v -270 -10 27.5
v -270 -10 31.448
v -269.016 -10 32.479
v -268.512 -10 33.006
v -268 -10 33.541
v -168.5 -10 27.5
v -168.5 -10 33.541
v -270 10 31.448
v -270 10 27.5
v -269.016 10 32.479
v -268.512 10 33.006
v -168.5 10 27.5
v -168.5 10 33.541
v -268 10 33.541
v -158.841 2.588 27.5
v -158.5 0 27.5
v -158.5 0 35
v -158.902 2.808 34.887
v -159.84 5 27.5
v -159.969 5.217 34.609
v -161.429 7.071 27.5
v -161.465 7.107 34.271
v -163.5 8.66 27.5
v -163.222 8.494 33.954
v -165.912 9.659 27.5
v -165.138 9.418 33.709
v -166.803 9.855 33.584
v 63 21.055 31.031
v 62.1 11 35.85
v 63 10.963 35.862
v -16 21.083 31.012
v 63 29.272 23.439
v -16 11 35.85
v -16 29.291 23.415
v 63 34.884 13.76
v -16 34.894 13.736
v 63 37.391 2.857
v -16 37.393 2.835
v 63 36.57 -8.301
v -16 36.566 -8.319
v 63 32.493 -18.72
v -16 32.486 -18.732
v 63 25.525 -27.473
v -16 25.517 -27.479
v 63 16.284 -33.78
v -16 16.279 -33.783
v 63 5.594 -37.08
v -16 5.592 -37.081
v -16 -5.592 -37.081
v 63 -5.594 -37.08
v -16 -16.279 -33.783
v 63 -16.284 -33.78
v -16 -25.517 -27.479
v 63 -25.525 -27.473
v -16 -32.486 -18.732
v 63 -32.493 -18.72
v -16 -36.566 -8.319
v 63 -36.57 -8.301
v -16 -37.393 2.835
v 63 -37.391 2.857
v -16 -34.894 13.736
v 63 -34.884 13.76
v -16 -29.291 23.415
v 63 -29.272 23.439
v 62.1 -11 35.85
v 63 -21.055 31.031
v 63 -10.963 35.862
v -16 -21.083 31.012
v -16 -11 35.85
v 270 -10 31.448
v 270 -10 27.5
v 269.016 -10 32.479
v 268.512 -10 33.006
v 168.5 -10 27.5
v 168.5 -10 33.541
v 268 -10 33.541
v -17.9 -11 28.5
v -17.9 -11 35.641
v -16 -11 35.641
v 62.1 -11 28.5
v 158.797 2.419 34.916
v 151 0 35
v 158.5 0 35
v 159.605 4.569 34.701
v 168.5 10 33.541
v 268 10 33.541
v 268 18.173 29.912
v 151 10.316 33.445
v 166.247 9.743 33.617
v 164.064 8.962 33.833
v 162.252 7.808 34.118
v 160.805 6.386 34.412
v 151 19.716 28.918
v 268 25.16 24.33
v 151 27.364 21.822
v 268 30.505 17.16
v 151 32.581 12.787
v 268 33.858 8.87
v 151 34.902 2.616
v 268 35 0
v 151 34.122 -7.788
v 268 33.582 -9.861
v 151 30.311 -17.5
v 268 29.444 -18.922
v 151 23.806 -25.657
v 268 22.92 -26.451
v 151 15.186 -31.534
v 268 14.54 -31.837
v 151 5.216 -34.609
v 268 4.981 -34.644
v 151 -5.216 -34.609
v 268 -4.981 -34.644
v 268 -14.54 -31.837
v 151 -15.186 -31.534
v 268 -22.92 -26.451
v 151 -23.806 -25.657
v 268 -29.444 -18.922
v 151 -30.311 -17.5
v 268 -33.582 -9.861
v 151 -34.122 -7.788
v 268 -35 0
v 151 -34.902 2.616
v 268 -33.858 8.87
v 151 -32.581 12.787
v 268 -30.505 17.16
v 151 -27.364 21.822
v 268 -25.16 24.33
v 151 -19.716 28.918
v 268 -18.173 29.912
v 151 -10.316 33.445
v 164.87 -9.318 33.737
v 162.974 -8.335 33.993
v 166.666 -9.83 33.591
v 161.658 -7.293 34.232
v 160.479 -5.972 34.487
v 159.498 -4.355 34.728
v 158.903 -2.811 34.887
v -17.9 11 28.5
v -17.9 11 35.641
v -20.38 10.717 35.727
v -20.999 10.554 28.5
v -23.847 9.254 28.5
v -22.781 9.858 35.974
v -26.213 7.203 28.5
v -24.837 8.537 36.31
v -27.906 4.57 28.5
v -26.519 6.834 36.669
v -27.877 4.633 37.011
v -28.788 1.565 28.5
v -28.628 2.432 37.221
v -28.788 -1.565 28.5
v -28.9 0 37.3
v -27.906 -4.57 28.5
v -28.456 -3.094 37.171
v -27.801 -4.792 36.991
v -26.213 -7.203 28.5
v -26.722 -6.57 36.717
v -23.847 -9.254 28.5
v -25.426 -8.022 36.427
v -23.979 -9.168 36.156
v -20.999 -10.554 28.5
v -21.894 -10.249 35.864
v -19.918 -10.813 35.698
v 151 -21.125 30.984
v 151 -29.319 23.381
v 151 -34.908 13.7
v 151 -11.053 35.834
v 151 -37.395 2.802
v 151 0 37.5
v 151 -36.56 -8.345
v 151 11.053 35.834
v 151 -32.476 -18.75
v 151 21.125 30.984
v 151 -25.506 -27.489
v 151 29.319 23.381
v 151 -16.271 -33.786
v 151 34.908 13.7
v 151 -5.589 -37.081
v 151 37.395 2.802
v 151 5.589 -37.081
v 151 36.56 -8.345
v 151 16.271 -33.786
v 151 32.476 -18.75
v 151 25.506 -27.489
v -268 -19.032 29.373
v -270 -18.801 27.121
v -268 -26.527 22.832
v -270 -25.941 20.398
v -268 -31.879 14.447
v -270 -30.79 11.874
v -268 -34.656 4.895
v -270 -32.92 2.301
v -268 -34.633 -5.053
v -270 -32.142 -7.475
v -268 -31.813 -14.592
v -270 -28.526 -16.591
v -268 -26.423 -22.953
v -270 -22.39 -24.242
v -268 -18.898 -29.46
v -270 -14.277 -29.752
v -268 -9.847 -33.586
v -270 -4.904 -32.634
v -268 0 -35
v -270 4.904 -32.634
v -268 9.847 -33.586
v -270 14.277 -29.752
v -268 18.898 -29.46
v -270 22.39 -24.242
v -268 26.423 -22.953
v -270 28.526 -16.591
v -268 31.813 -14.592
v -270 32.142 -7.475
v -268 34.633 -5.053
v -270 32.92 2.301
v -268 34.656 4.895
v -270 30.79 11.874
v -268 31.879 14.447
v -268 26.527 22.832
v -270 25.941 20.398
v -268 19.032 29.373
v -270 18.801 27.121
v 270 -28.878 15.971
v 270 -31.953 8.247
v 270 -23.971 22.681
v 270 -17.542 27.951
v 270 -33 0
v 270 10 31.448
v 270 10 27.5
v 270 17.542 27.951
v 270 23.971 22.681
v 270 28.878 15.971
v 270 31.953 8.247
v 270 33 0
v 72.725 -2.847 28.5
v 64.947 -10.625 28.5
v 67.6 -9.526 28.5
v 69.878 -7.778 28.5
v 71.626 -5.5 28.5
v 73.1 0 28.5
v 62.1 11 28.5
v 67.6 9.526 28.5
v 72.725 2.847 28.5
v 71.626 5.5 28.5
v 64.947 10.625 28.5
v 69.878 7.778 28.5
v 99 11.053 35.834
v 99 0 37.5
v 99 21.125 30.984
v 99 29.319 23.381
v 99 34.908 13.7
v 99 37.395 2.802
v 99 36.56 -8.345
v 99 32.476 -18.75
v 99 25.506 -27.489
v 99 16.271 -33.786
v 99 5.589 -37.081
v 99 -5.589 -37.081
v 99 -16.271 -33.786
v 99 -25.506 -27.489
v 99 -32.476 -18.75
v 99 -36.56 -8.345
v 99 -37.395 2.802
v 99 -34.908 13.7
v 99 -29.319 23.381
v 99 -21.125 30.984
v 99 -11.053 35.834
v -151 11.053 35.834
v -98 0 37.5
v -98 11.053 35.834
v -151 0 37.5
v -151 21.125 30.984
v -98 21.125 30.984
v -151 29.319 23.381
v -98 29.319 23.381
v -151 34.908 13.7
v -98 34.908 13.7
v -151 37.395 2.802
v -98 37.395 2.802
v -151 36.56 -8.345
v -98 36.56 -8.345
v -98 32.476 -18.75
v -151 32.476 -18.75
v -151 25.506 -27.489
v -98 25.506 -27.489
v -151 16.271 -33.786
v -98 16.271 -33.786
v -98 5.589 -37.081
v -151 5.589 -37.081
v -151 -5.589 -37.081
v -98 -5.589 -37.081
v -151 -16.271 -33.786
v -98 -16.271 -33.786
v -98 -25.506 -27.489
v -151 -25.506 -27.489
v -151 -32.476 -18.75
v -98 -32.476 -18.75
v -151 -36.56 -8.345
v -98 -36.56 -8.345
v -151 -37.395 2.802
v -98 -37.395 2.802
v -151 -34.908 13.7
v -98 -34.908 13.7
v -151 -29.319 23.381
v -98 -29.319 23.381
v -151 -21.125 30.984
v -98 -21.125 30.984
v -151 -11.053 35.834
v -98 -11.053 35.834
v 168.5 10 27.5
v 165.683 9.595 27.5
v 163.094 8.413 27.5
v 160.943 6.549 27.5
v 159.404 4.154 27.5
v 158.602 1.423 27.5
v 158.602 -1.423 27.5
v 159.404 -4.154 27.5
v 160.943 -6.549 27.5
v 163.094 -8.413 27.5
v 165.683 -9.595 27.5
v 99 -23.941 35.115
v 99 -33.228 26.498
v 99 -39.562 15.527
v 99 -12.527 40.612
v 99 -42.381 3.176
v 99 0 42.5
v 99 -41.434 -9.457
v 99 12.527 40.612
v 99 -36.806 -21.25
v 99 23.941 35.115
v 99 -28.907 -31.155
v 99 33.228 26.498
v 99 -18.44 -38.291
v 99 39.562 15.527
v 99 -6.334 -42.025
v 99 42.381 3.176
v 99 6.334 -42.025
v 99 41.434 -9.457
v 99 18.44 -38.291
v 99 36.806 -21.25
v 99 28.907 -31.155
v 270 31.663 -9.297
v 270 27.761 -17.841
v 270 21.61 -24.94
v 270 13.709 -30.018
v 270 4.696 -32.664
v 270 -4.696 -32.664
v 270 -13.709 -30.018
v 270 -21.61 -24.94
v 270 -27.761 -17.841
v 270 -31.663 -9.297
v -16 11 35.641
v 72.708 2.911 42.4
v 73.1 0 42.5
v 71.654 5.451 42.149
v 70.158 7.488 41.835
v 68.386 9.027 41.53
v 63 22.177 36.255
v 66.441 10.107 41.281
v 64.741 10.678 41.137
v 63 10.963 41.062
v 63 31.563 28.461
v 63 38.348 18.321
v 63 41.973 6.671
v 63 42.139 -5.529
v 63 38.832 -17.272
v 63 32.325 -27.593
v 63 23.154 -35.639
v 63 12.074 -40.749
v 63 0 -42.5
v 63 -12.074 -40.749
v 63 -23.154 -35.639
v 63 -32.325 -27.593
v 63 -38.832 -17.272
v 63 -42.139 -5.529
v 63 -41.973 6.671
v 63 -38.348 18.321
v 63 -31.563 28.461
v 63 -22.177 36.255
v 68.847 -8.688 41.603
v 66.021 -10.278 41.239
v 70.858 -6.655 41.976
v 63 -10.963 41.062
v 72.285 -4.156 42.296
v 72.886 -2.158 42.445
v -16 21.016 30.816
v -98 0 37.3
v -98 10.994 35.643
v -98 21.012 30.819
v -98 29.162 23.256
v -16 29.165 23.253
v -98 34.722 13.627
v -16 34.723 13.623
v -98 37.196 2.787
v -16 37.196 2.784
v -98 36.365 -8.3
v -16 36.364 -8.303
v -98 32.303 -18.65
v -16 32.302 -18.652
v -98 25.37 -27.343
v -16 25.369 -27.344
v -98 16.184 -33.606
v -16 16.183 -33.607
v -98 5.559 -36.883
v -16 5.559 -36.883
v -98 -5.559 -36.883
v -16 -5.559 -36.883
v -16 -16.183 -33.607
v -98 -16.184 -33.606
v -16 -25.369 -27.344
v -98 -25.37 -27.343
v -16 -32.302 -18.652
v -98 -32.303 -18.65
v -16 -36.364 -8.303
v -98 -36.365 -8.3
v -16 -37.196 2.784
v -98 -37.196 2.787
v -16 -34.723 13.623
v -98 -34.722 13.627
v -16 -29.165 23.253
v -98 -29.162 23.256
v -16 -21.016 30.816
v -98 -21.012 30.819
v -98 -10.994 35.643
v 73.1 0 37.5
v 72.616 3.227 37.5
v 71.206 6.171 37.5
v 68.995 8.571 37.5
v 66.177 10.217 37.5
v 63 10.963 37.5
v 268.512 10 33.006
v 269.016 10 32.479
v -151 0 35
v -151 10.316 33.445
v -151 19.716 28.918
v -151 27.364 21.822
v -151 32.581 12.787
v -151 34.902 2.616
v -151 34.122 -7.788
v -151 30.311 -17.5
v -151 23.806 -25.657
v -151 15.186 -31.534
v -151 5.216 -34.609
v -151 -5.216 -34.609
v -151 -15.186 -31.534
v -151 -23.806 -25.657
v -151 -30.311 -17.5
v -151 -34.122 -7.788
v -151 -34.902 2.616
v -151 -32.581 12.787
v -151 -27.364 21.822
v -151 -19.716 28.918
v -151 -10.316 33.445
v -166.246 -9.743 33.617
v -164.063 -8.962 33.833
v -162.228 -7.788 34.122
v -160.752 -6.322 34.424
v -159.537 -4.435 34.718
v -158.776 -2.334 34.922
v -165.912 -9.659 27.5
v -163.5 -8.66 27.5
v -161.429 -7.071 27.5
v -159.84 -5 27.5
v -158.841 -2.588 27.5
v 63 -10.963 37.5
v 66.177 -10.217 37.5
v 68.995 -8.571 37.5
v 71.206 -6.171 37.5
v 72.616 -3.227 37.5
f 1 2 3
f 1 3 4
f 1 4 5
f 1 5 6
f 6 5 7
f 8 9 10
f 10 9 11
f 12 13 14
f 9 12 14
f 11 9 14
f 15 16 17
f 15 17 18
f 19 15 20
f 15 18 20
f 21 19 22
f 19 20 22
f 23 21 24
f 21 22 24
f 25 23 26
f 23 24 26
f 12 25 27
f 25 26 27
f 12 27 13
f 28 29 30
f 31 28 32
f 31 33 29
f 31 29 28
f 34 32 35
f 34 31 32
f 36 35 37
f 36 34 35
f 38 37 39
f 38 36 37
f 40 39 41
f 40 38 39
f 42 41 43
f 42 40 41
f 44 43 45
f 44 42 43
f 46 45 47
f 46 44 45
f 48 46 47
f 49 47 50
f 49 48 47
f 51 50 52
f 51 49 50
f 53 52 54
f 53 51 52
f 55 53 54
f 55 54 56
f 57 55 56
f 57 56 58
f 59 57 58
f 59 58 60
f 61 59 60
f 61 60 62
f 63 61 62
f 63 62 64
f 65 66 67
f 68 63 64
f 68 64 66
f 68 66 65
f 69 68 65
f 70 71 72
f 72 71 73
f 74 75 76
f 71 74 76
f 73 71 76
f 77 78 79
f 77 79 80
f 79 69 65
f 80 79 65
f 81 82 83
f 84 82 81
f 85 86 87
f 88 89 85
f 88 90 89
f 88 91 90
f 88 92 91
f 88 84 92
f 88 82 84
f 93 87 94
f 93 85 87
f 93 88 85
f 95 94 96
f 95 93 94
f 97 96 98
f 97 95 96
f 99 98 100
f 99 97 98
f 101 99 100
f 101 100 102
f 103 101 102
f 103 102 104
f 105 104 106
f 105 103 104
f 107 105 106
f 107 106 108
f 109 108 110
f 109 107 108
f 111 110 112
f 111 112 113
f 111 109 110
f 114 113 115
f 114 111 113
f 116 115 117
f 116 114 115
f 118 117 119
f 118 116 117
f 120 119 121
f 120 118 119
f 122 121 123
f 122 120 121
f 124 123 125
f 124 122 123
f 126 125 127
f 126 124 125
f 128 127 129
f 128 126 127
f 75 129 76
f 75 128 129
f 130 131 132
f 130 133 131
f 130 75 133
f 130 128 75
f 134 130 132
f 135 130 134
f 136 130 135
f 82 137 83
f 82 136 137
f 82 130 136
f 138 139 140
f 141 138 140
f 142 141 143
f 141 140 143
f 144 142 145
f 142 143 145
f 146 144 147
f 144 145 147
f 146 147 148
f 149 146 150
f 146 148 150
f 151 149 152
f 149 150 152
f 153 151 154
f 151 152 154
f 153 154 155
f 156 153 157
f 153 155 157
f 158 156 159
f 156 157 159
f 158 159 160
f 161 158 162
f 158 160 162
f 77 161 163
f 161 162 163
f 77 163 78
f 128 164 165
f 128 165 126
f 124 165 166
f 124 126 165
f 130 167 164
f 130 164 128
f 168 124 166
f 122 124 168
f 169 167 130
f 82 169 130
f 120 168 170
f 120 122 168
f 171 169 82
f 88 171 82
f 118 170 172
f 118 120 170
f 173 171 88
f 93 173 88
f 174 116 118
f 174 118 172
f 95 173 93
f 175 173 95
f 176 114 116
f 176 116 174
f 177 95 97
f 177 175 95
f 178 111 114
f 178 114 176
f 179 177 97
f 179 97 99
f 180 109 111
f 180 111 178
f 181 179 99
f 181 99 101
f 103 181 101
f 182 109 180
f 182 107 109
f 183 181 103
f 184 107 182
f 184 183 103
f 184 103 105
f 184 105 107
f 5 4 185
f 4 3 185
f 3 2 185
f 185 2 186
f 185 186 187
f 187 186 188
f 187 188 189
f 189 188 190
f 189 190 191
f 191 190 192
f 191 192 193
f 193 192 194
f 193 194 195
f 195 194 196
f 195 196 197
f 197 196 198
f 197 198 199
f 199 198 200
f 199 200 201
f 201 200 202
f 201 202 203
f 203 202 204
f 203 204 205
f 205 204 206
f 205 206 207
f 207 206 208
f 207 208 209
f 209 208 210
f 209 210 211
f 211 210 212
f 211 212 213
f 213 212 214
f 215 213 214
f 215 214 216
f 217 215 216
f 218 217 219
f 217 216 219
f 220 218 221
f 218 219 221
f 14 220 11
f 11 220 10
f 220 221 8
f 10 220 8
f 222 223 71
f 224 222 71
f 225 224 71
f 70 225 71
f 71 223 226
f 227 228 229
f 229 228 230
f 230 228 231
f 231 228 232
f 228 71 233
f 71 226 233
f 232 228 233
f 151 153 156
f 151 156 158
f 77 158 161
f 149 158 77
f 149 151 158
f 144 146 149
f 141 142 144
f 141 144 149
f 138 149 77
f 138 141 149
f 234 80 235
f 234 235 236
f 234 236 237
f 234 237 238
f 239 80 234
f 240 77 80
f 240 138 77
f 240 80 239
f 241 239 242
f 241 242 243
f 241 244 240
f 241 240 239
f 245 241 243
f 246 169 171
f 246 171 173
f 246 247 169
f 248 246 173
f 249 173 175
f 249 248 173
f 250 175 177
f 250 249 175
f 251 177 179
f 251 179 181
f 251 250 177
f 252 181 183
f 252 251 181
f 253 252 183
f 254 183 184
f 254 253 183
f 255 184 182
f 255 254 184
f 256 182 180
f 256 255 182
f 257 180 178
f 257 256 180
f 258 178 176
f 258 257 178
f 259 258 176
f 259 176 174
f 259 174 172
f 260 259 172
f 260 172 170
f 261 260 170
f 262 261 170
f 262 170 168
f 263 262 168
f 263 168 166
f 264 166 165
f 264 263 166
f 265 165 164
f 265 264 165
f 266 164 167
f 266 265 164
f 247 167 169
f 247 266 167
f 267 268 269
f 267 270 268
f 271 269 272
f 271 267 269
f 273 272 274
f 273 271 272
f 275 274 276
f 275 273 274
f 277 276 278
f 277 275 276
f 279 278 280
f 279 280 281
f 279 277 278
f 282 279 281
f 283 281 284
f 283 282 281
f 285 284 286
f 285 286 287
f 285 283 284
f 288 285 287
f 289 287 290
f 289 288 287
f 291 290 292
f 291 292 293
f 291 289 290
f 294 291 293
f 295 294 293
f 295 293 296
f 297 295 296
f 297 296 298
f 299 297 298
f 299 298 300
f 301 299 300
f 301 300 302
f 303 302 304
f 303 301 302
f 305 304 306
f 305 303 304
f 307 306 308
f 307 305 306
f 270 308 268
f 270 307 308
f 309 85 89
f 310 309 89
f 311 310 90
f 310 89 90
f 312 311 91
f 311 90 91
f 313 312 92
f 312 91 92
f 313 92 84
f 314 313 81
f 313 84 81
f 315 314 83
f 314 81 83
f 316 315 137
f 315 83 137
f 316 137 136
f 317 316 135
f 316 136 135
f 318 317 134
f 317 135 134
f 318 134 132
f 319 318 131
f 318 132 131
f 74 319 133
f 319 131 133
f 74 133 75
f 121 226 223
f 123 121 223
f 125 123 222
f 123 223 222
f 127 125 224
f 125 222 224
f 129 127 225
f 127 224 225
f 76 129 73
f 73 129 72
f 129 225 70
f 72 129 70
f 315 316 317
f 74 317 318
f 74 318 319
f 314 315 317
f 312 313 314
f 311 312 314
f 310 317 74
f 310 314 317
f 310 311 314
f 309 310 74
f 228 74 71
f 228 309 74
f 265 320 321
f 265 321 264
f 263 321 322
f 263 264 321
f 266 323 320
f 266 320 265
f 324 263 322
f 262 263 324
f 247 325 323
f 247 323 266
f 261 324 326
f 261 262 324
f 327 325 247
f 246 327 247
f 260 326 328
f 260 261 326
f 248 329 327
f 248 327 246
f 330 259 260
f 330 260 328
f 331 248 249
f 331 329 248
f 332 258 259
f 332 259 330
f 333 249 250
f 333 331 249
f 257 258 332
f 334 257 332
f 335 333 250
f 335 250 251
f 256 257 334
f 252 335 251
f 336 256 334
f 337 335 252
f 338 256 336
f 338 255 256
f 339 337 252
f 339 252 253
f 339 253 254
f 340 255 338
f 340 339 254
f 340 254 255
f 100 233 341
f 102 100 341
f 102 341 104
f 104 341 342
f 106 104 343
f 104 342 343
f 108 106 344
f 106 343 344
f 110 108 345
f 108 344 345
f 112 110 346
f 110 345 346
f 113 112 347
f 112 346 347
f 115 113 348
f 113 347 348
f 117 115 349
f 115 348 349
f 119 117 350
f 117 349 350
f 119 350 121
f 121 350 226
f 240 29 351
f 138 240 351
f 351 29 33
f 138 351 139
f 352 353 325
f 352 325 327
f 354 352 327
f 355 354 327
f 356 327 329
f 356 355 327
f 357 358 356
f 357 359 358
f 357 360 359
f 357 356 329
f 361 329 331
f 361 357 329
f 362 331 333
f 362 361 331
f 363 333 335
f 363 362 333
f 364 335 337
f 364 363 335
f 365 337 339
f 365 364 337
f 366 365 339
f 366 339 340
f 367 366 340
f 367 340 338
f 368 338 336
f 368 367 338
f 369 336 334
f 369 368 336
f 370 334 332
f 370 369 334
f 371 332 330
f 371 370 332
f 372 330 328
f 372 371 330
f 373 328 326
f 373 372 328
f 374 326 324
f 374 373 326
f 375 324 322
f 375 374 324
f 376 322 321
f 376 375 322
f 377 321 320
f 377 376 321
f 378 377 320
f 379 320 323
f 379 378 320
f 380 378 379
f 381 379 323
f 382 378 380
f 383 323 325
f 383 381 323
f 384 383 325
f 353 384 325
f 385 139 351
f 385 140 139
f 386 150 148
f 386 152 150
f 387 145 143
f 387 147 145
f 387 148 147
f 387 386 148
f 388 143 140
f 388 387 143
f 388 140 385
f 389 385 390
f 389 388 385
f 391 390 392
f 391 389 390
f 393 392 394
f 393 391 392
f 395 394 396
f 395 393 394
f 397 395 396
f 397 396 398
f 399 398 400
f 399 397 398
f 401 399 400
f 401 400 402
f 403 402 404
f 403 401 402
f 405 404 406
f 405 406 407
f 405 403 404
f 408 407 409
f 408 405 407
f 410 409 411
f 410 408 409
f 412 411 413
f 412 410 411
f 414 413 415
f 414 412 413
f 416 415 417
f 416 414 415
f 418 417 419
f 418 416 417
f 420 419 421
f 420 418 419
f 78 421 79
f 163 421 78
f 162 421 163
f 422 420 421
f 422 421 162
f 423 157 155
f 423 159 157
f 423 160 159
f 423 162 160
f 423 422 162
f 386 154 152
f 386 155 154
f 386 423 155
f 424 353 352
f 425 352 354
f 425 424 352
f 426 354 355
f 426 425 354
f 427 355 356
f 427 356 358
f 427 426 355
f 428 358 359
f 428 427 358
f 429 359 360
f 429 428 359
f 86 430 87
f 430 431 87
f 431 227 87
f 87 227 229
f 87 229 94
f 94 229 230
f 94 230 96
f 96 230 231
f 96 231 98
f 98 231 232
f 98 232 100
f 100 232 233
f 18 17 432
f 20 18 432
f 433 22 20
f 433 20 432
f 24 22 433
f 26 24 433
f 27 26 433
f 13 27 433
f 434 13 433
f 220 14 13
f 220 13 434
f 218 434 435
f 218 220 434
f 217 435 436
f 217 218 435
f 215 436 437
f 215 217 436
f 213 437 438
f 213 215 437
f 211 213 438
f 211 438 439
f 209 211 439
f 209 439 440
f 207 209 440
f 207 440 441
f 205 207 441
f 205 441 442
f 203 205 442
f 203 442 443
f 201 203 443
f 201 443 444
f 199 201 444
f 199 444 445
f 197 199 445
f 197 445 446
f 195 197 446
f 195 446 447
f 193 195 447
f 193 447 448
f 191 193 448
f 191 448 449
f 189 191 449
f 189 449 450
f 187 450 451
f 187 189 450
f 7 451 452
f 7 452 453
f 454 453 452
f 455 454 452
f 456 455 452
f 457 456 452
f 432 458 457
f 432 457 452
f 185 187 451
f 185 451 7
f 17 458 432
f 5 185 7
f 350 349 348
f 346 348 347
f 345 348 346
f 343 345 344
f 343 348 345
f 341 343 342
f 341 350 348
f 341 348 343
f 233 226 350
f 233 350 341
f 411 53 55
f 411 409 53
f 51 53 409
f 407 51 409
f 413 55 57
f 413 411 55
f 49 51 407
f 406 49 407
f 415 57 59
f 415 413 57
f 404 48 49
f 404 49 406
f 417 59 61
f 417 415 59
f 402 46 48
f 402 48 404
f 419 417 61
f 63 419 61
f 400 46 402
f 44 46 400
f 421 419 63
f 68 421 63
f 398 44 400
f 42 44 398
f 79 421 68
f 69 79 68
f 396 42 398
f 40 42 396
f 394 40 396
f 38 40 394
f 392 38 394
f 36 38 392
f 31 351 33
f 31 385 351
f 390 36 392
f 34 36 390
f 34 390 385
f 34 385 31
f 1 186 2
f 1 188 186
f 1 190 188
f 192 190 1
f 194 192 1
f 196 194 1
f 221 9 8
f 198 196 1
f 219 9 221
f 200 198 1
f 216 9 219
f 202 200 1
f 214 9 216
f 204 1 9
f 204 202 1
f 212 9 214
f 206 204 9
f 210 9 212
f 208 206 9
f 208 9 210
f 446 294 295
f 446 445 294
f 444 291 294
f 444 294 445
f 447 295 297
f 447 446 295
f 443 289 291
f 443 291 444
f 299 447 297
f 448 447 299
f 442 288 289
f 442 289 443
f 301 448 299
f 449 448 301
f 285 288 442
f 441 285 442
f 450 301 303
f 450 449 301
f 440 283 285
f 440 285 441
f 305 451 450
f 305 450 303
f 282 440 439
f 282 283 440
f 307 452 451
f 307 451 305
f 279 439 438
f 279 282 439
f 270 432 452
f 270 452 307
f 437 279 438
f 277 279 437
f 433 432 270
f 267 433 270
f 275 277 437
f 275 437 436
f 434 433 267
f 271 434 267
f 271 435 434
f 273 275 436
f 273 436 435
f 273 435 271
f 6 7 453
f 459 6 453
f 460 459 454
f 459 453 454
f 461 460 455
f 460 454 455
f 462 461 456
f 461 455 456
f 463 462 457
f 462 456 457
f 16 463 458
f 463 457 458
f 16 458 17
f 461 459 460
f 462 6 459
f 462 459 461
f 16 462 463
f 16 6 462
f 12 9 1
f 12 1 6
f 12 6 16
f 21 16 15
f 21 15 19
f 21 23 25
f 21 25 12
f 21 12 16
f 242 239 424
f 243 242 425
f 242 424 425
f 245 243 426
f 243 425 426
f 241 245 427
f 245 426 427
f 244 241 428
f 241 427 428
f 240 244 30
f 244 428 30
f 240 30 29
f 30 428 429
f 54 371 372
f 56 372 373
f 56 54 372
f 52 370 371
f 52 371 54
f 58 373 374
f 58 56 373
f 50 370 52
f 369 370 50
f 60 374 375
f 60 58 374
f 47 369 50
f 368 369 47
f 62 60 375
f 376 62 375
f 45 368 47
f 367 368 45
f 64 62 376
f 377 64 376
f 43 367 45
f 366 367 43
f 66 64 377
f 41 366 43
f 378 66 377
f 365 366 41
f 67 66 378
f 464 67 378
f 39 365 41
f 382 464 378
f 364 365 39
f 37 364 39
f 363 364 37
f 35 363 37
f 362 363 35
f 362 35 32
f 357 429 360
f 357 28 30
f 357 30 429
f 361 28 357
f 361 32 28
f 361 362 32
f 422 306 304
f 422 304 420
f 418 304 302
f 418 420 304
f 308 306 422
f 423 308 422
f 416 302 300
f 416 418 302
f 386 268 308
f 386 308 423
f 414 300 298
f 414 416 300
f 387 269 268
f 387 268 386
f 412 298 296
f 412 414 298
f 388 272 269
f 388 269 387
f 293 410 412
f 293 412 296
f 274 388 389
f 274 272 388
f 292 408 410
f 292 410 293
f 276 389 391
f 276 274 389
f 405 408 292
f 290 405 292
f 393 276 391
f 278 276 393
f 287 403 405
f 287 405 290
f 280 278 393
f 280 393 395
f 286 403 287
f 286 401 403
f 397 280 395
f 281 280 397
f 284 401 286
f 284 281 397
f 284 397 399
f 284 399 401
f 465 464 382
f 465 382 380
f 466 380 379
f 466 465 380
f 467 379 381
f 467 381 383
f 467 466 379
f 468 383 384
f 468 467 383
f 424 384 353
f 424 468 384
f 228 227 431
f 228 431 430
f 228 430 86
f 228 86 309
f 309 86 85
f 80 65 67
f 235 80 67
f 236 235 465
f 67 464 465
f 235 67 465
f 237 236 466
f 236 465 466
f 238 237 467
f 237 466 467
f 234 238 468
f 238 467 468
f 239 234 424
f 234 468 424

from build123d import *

# Parameters (mm, degrees)
F4_DEPTH  = 7.5
F7_DEPTH  = 9
F8_DEPTH  = 14.001
F9_W      = 61.8011951447
F9_H      = 108.7959855795
F9_W_2    = 52.8042912483
F9_H_2    = 139.1329020262
F10_DEPTH = 42.5010001
F11_DEPTH = 42.5010001
F12_SIZE  = 2


with BuildPart() as f1:
    # F0 (on Front) → F1 (revolve)
    with BuildSketch(Plane.XZ):
        Polygon((-291, 35), (-291, 0), (291, 0), (291, 35), (151, 35), (151, 37.5), (99, 37.5), (99, 42.5), (63, 42.5), (63, 37.5), (-16, 37.5), (-16, 37.3), (-98, 37.3), (-98, 37.5), (-151, 37.5), (-151, 35), align=None)
    revolve(axis=Axis((0, 0, 0), (-1, 0, 0)))

    # F3 (on offset) → F4 (cut)
    with BuildSketch(Plane.XY.offset(35)):
        with BuildLine():
            Line((-168.5, 10), (-273.5, 10))
            ThreePointArc((-273.5, 10), (-266.4289321881, 7.0710678119), (-263.5, 0))
            ThreePointArc((-263.5, 0), (-266.4289321881, -7.0710678119), (-273.5, -10))
            Line((-273.5, -10), (-168.5, -10))
            ThreePointArc((-168.5, -10), (-178.5, 0), (-168.5, 10))
        make_face()
        with BuildLine():
            ThreePointArc((-263.5, 0), (-266.4289321881, 7.0710678119), (-273.5, 10))
            Line((-273.5, 10), (-273.5, -10))
            ThreePointArc((-273.5, -10), (-266.4289321881, -7.0710678119), (-263.5, 0))
        make_face()
        with BuildLine():
            Line((-273.5, -10), (-273.5, 10))
            ThreePointArc((-273.5, 10), (-283.5, 0), (-273.5, -10))
        make_face()
        with BuildLine():
            Line((-168.5, -10), (-168.5, 10))
            ThreePointArc((-168.5, 10), (-178.5, 0), (-168.5, -10))
        make_face()
        with BuildLine():
            ThreePointArc((-158.5, 0), (-161.4289321881, 7.0710678119), (-168.5, 10))
            Line((-168.5, 10), (-168.5, -10))
            ThreePointArc((-168.5, -10), (-161.4289321881, -7.0710678119), (-158.5, 0))
        make_face()
        with BuildLine():
            Line((168.5, -10), (168.5, 10))
            ThreePointArc((168.5, 10), (158.5, 0), (168.5, -10))
        make_face()
        with BuildLine():
            ThreePointArc((178.5, 0), (175.5710678119, 7.0710678119), (168.5, 10))
            Line((168.5, 10), (168.5, -10))
            ThreePointArc((168.5, -10), (175.5710678119, -7.0710678119), (178.5, 0))
        make_face()
        with BuildLine():
            Line((273.5, -10), (273.5, 10))
            ThreePointArc((273.5, 10), (263.5, 0), (273.5, -10))
        make_face()
        with BuildLine():
            ThreePointArc((283.5, 0), (280.5710678119, 7.0710678119), (273.5, 10))
            Line((273.5, 10), (273.5, -10))
            ThreePointArc((273.5, -10), (280.5710678119, -7.0710678119), (283.5, 0))
        make_face()
        with BuildLine():
            Line((273.5, 10), (168.5, 10))
            ThreePointArc((168.5, 10), (175.5710678119, 7.0710678119), (178.5, 0))
            ThreePointArc((178.5, 0), (175.5710678119, -7.0710678119), (168.5, -10))
            Line((168.5, -10), (273.5, -10))
            ThreePointArc((273.5, -10), (263.5, 0), (273.5, 10))
        make_face()
    extrude(amount=-F4_DEPTH, mode=Mode.SUBTRACT)

    # F6 (on offset) → F7 (cut)
    with BuildSketch(Plane.XY.offset(37.5)):
        with BuildLine():
            ThreePointArc((73.1, 0), (69.8781745931, 7.7781745931), (62.1, 11))
            Line((62.1, 11), (62.1, -11))
            ThreePointArc((62.1, -11), (69.8781745931, -7.7781745931), (73.1, 0))
        make_face()
        with BuildLine():
            Line((62.1, 11), (-17.9, 11))
            ThreePointArc((-17.9, 11), (-10.1218254069, 7.7781745931), (-6.9, 0))
            ThreePointArc((-6.9, 0), (-10.1218254069, -7.7781745931), (-17.9, -11))
            Line((-17.9, -11), (62.1, -11))
            ThreePointArc((62.1, -11), (51.1, 0), (62.1, 11))
        make_face()
        with BuildLine():
            Line((62.1, -11), (62.1, 11))
            ThreePointArc((62.1, 11), (51.1, 0), (62.1, -11))
        make_face()
        with BuildLine():
            Line((-17.9, -11), (-17.9, 11))
            ThreePointArc((-17.9, 11), (-28.9, 0), (-17.9, -11))
        make_face()
        with BuildLine():
            ThreePointArc((-6.9, 0), (-10.1218254069, 7.7781745931), (-17.9, 11))
            Line((-17.9, 11), (-17.9, -11))
            ThreePointArc((-17.9, -11), (-10.1218254069, -7.7781745931), (-6.9, 0))
        make_face()
    extrude(amount=-F7_DEPTH, mode=Mode.SUBTRACT)

    # F8 (cut, through all): a face of the model
    f8_faces = [f1.faces().sort_by_distance(p)[0] for p in [
        (22.1, 0, 28.5),
    ]]
    extrude(f8_faces, amount=F8_DEPTH, mode=Mode.SUBTRACT)

    # F9 (on Top) → F10 (cut, through all)
    with BuildSketch(Plane.XY):
        with Locations((-300.9005975723, 0)):
            Rectangle(F9_W, F9_H)
        with Locations((296.4021456242, 0)):
            Rectangle(F9_W_2, F9_H_2)
    extrude(amount=-F10_DEPTH, mode=Mode.SUBTRACT)

    # F11 (cut, through all): faces of the model
    f11_faces = [f1.faces().sort_by_distance(p)[0] for p in [
        (-280.5, 0, 0),
        (280.5, 0, 0),
    ]]
    extrude(f11_faces, amount=-F11_DEPTH, mode=Mode.SUBTRACT)

    # F12
    f12_edges = [f1.edges().sort_by_distance(p)[0] for p in [
        (-270, 0, -35),
        (270, 0, -35),
    ]]
    chamfer(f12_edges, length=F12_SIZE)


solid = f1.part
